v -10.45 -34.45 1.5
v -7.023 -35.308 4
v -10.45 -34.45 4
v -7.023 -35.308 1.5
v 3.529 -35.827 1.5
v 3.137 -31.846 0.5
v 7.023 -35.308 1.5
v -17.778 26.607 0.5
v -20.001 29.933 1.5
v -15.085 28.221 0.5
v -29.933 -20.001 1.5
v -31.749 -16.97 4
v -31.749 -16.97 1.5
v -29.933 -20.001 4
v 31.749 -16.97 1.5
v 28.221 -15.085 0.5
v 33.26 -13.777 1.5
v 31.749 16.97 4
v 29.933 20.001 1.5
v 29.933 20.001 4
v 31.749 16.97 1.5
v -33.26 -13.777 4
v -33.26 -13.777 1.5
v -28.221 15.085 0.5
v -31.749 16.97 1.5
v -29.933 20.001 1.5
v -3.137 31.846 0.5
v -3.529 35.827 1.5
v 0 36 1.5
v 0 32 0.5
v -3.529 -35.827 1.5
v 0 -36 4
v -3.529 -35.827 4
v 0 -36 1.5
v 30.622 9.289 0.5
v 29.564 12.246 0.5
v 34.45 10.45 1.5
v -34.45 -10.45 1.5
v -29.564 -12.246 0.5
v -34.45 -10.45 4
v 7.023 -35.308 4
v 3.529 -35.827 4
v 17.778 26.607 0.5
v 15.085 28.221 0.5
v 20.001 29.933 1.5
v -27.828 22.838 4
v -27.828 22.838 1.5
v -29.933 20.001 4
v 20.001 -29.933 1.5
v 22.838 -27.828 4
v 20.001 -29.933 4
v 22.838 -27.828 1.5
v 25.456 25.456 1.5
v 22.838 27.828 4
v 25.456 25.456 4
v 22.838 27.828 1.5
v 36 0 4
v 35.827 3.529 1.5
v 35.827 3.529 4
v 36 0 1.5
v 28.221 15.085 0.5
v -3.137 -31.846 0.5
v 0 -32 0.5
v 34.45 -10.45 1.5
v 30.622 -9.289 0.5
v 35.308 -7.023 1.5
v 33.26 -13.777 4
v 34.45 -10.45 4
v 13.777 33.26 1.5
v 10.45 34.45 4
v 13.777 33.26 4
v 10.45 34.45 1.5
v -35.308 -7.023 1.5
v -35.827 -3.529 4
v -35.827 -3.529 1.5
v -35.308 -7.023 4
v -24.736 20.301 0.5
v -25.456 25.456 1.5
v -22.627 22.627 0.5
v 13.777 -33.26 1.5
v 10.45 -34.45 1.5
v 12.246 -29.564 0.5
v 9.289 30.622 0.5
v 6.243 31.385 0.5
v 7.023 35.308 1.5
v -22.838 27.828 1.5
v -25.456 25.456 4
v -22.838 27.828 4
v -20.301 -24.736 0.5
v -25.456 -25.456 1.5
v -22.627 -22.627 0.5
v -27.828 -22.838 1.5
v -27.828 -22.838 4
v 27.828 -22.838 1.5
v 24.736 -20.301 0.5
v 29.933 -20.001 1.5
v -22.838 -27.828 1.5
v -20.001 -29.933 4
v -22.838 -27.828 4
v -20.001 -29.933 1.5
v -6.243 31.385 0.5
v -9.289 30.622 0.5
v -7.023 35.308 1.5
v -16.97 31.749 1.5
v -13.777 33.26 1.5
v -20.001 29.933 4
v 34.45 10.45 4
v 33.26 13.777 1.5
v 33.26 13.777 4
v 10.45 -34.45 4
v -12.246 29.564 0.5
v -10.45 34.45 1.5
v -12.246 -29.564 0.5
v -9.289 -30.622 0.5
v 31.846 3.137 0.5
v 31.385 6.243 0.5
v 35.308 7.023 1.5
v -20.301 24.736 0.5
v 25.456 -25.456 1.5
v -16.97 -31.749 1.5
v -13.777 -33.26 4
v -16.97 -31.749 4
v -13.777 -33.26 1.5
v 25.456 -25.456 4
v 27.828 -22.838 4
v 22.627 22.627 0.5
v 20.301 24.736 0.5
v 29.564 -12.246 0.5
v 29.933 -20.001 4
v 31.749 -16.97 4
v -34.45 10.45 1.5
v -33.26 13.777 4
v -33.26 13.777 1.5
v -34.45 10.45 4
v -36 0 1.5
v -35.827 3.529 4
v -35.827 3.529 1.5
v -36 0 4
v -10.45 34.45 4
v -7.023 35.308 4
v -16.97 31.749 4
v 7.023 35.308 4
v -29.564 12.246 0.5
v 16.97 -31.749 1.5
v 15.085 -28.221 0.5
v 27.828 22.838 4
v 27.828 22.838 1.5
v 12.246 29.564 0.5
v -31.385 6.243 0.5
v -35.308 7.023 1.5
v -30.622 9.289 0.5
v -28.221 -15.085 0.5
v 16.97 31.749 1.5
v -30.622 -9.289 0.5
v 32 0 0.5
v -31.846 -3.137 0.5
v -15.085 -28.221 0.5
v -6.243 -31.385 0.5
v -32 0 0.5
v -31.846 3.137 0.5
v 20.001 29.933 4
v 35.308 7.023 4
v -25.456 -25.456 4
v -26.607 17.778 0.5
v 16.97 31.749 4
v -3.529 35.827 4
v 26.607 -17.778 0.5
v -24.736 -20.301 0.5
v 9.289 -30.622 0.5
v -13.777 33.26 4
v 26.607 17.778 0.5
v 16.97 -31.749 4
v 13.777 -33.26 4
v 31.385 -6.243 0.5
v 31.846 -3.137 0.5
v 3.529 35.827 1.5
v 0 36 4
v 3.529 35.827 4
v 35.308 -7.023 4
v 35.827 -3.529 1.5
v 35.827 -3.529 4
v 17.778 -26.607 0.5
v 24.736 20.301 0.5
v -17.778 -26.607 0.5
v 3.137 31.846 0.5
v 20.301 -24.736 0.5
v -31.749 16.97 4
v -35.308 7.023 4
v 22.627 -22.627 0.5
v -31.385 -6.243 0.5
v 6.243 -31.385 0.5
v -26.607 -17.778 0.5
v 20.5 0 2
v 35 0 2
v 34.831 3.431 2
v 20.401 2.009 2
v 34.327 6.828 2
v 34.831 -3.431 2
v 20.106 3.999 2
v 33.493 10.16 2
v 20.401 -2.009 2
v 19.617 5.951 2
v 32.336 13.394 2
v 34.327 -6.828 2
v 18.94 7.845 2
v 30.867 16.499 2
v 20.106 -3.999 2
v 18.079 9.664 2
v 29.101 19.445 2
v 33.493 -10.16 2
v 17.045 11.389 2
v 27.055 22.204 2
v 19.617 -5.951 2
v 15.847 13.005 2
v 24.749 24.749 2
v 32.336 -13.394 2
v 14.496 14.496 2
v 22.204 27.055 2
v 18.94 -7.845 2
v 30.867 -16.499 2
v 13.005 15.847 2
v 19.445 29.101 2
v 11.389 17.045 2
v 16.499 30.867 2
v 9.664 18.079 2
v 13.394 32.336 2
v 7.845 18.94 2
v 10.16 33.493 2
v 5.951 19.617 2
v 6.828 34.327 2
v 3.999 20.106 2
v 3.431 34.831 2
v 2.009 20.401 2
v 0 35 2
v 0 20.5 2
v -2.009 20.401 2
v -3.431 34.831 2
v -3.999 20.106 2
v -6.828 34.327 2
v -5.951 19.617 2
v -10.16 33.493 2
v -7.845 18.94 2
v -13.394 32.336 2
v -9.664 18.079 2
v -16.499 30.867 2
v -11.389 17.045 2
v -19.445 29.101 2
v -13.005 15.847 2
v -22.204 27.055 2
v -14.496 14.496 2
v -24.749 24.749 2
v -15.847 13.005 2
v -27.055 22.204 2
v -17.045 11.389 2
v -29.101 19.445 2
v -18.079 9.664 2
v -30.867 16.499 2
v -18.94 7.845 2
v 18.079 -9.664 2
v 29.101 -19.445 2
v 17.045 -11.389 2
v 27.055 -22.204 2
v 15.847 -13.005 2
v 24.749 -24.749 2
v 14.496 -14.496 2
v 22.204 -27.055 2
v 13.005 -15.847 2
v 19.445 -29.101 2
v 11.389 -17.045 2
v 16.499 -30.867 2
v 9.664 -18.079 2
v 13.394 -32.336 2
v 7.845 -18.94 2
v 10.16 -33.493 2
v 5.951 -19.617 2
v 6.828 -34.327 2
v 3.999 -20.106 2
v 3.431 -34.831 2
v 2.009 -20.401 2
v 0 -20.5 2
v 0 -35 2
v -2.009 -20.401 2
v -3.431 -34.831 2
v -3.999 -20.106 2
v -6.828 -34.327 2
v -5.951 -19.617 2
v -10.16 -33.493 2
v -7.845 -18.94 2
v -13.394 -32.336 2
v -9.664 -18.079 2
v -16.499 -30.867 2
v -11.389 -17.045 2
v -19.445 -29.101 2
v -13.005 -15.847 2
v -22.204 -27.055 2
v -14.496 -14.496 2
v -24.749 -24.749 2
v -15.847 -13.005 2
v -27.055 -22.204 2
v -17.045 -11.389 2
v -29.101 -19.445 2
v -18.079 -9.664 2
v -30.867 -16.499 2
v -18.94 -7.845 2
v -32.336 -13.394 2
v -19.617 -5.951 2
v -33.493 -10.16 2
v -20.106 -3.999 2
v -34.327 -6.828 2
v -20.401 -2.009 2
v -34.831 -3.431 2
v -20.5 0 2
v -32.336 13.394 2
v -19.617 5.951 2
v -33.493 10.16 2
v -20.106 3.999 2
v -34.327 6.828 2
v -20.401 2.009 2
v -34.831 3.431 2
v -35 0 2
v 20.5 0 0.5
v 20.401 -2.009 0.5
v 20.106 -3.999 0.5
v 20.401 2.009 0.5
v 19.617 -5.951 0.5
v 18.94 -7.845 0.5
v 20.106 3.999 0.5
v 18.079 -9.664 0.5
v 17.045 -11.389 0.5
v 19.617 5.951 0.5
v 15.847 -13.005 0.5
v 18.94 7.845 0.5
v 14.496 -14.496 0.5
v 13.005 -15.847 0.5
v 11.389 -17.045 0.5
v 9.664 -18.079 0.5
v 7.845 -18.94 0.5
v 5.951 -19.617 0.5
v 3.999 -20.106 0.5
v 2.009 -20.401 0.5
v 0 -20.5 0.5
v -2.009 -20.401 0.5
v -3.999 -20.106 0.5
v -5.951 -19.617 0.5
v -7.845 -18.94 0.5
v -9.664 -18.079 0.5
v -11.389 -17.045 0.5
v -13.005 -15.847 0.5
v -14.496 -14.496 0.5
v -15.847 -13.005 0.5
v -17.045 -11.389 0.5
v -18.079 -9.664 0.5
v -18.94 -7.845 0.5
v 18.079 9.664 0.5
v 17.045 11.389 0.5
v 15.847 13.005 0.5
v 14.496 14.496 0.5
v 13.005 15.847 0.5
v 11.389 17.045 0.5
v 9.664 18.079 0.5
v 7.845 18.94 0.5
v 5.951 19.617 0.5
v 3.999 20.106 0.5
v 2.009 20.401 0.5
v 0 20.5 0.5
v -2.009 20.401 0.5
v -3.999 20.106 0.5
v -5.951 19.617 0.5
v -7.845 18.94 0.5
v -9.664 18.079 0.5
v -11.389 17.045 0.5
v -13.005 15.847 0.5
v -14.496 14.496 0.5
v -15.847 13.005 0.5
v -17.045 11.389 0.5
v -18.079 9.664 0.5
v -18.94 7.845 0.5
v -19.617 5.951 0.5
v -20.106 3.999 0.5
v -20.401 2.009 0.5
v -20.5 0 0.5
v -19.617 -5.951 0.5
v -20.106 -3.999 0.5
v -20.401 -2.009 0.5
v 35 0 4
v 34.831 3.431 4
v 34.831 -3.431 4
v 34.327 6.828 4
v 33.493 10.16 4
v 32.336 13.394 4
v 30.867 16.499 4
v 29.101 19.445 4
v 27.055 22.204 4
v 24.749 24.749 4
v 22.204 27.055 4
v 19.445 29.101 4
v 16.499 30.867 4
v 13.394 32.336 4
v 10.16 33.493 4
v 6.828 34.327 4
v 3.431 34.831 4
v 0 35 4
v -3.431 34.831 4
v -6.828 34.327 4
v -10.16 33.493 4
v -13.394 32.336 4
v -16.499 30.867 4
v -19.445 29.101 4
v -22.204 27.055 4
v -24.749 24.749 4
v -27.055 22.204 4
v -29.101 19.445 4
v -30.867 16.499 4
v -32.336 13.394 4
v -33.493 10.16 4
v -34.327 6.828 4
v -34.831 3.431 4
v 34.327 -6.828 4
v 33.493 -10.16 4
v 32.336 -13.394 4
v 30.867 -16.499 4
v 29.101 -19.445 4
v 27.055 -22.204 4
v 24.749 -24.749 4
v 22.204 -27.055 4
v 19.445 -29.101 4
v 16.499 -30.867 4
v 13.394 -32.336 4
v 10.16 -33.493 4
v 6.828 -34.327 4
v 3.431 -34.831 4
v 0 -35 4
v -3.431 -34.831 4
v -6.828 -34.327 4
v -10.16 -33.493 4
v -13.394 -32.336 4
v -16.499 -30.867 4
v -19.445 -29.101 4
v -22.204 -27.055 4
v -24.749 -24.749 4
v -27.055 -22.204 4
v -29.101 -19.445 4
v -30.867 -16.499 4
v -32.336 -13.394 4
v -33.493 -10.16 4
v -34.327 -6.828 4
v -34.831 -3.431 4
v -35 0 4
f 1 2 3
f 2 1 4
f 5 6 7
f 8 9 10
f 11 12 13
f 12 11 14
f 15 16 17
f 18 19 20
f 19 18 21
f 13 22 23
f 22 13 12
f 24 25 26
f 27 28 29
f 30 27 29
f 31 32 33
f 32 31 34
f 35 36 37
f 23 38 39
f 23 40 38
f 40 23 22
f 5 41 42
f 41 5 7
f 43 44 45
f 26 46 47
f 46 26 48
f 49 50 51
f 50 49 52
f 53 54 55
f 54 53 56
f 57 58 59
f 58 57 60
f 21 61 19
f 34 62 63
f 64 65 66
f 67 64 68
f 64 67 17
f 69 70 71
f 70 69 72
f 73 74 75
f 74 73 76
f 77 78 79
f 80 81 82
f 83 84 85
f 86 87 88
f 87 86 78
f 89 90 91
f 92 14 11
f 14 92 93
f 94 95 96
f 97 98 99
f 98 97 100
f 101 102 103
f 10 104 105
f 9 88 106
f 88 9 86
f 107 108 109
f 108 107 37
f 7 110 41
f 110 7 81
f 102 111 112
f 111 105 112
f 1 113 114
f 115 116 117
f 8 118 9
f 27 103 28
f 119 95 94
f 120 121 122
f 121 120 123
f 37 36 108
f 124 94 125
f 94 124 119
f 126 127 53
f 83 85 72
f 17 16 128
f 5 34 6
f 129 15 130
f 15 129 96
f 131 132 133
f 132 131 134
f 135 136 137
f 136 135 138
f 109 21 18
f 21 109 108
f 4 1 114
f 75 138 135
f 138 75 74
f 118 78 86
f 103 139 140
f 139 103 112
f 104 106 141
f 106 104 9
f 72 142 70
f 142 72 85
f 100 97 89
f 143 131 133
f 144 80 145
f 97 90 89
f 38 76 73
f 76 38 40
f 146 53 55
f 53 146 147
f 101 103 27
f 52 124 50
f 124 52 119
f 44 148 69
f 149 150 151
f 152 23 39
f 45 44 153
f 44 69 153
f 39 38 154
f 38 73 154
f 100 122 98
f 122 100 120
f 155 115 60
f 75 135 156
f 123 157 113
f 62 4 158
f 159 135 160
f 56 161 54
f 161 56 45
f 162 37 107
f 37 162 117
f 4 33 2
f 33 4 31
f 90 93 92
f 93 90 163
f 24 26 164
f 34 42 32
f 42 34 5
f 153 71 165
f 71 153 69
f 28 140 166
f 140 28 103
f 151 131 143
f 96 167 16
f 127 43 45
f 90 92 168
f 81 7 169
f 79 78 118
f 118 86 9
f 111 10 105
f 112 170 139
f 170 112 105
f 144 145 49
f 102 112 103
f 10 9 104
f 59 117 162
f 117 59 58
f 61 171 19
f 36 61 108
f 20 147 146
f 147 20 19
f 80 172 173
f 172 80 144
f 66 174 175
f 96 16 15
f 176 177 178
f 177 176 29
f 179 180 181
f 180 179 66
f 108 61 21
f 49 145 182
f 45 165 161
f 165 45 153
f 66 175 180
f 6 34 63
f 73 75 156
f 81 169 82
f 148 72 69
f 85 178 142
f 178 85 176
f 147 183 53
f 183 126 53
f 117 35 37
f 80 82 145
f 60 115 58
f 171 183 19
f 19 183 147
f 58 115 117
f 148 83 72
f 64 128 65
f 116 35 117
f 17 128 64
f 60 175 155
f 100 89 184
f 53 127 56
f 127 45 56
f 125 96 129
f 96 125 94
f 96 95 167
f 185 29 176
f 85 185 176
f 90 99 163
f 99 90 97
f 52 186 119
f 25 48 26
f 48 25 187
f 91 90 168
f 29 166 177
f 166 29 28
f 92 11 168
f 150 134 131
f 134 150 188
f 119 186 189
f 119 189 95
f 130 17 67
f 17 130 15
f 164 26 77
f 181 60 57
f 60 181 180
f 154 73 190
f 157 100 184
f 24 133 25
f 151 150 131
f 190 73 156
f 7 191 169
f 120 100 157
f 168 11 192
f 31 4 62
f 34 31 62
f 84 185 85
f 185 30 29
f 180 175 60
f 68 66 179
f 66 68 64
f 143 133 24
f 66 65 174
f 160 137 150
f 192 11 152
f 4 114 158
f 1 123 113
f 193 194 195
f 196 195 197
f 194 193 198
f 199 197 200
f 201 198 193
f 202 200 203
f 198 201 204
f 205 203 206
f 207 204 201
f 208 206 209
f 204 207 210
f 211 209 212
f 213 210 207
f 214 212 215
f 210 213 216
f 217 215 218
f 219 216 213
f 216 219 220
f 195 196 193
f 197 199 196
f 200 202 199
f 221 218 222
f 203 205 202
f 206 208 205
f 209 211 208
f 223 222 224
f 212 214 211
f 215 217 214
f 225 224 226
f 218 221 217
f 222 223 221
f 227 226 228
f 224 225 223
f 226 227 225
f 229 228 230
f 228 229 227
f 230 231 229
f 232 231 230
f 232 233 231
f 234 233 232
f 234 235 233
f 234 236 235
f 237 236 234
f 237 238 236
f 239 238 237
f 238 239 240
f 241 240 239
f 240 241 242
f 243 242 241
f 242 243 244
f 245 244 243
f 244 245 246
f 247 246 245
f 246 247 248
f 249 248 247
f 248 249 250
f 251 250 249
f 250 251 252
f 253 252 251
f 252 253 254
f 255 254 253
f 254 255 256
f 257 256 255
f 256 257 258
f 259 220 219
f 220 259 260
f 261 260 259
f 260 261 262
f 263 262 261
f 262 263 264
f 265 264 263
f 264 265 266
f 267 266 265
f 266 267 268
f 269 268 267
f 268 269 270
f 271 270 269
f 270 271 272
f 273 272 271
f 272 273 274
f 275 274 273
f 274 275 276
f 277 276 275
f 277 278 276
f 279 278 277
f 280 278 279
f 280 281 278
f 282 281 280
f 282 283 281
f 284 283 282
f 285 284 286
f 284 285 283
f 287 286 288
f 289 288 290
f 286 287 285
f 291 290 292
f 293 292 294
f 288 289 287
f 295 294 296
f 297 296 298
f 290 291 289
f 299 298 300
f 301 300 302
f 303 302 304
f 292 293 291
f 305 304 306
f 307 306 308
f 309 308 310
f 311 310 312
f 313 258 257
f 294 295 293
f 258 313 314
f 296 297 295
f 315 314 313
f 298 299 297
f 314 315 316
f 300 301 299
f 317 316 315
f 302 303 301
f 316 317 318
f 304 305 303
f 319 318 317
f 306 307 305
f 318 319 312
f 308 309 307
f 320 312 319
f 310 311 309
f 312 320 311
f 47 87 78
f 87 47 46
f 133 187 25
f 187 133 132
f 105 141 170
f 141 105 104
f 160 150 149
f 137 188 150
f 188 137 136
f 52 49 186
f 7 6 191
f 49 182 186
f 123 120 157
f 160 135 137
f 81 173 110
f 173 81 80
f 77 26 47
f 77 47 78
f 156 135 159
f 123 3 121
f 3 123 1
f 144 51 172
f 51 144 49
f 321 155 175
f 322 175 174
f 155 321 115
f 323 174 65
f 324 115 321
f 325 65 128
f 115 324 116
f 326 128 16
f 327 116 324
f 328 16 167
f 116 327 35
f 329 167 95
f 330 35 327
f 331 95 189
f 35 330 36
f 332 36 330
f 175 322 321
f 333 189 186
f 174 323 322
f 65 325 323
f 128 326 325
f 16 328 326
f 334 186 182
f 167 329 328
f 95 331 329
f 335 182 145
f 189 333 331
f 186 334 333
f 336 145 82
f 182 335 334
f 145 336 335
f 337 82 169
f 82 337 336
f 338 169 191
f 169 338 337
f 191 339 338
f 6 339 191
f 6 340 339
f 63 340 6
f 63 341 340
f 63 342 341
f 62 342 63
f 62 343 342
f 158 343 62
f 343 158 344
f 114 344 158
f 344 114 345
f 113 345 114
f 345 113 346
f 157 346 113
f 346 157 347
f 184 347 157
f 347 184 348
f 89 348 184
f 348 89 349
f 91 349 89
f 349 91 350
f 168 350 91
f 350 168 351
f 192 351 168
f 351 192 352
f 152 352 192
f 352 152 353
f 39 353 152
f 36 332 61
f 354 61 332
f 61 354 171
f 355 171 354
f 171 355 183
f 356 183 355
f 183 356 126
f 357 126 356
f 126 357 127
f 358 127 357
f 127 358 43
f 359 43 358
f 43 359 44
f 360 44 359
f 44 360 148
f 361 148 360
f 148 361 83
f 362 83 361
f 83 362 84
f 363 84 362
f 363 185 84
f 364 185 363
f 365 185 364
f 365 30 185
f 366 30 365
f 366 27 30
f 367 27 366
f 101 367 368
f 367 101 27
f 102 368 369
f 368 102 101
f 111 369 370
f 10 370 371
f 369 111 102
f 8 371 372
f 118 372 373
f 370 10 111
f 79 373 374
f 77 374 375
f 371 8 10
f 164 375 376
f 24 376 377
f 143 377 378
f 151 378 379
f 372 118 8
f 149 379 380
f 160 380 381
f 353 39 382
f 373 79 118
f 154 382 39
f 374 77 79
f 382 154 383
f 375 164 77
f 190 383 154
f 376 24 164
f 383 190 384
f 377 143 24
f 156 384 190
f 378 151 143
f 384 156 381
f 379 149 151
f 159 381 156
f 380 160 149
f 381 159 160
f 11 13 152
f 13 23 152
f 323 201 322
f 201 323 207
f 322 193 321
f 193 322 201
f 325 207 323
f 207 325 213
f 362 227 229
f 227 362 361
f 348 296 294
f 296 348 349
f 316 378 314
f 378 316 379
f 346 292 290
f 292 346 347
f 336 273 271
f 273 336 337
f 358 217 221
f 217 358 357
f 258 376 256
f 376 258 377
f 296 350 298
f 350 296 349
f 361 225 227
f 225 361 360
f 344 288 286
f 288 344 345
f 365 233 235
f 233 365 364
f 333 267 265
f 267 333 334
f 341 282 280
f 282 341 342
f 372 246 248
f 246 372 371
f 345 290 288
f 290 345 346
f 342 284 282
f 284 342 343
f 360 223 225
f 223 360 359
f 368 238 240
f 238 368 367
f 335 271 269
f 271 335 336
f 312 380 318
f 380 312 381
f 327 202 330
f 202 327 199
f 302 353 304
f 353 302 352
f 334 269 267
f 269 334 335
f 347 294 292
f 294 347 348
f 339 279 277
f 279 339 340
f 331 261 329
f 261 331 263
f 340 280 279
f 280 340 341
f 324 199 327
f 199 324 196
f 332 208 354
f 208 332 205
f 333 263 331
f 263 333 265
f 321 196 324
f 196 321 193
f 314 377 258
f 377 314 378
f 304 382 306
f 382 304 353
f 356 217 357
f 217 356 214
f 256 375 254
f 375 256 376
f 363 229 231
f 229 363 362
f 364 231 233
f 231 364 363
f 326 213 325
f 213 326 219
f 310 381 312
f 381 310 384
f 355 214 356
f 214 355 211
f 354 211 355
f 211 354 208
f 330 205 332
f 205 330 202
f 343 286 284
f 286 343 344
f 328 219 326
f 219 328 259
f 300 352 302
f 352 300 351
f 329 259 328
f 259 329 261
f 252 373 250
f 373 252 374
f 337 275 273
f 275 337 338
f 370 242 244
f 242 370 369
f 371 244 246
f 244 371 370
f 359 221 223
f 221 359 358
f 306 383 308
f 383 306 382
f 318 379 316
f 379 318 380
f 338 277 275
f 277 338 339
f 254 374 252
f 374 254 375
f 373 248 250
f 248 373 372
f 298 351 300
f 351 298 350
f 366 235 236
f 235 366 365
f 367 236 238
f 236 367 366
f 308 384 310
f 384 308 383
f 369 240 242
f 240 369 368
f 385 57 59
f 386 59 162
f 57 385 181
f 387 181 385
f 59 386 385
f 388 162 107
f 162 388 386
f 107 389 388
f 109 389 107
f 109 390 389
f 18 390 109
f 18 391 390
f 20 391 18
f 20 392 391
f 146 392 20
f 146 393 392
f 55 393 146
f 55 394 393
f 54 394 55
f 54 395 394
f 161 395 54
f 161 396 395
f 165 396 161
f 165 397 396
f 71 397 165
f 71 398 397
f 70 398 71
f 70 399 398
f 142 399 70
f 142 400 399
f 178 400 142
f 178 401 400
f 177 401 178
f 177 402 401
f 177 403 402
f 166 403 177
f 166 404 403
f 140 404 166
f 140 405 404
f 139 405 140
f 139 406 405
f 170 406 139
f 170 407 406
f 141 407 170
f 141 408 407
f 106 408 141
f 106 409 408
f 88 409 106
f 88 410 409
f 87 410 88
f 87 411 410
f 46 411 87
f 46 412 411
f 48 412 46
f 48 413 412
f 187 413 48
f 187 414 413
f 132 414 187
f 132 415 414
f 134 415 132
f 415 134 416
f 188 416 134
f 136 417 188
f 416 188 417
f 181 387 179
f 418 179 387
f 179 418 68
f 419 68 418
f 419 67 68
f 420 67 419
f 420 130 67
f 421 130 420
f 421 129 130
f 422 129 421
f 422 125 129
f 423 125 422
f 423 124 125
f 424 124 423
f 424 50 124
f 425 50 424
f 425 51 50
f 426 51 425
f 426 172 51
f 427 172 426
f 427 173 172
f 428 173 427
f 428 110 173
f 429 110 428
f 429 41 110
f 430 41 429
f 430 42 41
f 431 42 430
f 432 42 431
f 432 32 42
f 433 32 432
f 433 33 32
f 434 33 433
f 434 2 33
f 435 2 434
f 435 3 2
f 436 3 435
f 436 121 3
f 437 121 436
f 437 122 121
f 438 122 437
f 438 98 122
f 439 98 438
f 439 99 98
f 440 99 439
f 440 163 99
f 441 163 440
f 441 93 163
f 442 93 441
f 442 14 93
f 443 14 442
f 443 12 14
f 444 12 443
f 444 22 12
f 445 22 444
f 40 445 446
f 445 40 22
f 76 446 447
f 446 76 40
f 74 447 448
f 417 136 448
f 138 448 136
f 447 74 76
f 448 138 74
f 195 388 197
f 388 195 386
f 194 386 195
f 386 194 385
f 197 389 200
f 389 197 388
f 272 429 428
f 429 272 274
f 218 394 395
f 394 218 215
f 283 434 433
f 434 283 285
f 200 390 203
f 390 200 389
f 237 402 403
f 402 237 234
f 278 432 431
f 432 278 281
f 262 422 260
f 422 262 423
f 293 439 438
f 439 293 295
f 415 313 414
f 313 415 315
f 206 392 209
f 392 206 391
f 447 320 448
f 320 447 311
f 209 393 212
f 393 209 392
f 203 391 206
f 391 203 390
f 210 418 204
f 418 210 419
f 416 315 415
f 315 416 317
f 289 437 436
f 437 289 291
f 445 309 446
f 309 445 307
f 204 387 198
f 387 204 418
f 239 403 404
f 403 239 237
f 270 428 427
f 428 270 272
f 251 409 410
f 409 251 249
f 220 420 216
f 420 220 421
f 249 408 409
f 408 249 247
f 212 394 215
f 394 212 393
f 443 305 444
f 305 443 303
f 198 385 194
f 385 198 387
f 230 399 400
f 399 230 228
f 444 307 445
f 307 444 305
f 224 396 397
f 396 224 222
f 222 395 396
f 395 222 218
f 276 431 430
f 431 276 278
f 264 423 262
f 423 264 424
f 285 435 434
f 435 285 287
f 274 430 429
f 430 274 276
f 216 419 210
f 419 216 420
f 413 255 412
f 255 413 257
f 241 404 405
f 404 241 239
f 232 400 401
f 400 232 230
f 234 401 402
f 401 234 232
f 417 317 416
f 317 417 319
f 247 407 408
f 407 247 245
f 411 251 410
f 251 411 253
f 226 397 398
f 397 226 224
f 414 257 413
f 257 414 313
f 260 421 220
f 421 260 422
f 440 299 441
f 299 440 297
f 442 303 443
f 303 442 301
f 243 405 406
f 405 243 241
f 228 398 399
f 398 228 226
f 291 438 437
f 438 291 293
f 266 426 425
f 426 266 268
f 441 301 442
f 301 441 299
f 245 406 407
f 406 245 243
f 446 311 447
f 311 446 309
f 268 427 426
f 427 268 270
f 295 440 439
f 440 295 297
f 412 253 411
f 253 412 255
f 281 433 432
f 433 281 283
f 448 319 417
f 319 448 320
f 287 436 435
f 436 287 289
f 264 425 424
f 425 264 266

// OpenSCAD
$fn = $preview ? 8 : 64;

translate([0,0,2]) {
    rotate([180,0,0]) {
        difference() {
            hull() {   
                cylinder(d=72,h=0.5);
                translate([0,0,0])
                    cylinder(d=64,h=1.5);
            }
            cylinder(h=2, d=41);
        }
    }
}
translate([0,0,2]) {
    difference() {
        cylinder(d=72,h=2);
        cylinder(d=70,h=2);
    }
}
